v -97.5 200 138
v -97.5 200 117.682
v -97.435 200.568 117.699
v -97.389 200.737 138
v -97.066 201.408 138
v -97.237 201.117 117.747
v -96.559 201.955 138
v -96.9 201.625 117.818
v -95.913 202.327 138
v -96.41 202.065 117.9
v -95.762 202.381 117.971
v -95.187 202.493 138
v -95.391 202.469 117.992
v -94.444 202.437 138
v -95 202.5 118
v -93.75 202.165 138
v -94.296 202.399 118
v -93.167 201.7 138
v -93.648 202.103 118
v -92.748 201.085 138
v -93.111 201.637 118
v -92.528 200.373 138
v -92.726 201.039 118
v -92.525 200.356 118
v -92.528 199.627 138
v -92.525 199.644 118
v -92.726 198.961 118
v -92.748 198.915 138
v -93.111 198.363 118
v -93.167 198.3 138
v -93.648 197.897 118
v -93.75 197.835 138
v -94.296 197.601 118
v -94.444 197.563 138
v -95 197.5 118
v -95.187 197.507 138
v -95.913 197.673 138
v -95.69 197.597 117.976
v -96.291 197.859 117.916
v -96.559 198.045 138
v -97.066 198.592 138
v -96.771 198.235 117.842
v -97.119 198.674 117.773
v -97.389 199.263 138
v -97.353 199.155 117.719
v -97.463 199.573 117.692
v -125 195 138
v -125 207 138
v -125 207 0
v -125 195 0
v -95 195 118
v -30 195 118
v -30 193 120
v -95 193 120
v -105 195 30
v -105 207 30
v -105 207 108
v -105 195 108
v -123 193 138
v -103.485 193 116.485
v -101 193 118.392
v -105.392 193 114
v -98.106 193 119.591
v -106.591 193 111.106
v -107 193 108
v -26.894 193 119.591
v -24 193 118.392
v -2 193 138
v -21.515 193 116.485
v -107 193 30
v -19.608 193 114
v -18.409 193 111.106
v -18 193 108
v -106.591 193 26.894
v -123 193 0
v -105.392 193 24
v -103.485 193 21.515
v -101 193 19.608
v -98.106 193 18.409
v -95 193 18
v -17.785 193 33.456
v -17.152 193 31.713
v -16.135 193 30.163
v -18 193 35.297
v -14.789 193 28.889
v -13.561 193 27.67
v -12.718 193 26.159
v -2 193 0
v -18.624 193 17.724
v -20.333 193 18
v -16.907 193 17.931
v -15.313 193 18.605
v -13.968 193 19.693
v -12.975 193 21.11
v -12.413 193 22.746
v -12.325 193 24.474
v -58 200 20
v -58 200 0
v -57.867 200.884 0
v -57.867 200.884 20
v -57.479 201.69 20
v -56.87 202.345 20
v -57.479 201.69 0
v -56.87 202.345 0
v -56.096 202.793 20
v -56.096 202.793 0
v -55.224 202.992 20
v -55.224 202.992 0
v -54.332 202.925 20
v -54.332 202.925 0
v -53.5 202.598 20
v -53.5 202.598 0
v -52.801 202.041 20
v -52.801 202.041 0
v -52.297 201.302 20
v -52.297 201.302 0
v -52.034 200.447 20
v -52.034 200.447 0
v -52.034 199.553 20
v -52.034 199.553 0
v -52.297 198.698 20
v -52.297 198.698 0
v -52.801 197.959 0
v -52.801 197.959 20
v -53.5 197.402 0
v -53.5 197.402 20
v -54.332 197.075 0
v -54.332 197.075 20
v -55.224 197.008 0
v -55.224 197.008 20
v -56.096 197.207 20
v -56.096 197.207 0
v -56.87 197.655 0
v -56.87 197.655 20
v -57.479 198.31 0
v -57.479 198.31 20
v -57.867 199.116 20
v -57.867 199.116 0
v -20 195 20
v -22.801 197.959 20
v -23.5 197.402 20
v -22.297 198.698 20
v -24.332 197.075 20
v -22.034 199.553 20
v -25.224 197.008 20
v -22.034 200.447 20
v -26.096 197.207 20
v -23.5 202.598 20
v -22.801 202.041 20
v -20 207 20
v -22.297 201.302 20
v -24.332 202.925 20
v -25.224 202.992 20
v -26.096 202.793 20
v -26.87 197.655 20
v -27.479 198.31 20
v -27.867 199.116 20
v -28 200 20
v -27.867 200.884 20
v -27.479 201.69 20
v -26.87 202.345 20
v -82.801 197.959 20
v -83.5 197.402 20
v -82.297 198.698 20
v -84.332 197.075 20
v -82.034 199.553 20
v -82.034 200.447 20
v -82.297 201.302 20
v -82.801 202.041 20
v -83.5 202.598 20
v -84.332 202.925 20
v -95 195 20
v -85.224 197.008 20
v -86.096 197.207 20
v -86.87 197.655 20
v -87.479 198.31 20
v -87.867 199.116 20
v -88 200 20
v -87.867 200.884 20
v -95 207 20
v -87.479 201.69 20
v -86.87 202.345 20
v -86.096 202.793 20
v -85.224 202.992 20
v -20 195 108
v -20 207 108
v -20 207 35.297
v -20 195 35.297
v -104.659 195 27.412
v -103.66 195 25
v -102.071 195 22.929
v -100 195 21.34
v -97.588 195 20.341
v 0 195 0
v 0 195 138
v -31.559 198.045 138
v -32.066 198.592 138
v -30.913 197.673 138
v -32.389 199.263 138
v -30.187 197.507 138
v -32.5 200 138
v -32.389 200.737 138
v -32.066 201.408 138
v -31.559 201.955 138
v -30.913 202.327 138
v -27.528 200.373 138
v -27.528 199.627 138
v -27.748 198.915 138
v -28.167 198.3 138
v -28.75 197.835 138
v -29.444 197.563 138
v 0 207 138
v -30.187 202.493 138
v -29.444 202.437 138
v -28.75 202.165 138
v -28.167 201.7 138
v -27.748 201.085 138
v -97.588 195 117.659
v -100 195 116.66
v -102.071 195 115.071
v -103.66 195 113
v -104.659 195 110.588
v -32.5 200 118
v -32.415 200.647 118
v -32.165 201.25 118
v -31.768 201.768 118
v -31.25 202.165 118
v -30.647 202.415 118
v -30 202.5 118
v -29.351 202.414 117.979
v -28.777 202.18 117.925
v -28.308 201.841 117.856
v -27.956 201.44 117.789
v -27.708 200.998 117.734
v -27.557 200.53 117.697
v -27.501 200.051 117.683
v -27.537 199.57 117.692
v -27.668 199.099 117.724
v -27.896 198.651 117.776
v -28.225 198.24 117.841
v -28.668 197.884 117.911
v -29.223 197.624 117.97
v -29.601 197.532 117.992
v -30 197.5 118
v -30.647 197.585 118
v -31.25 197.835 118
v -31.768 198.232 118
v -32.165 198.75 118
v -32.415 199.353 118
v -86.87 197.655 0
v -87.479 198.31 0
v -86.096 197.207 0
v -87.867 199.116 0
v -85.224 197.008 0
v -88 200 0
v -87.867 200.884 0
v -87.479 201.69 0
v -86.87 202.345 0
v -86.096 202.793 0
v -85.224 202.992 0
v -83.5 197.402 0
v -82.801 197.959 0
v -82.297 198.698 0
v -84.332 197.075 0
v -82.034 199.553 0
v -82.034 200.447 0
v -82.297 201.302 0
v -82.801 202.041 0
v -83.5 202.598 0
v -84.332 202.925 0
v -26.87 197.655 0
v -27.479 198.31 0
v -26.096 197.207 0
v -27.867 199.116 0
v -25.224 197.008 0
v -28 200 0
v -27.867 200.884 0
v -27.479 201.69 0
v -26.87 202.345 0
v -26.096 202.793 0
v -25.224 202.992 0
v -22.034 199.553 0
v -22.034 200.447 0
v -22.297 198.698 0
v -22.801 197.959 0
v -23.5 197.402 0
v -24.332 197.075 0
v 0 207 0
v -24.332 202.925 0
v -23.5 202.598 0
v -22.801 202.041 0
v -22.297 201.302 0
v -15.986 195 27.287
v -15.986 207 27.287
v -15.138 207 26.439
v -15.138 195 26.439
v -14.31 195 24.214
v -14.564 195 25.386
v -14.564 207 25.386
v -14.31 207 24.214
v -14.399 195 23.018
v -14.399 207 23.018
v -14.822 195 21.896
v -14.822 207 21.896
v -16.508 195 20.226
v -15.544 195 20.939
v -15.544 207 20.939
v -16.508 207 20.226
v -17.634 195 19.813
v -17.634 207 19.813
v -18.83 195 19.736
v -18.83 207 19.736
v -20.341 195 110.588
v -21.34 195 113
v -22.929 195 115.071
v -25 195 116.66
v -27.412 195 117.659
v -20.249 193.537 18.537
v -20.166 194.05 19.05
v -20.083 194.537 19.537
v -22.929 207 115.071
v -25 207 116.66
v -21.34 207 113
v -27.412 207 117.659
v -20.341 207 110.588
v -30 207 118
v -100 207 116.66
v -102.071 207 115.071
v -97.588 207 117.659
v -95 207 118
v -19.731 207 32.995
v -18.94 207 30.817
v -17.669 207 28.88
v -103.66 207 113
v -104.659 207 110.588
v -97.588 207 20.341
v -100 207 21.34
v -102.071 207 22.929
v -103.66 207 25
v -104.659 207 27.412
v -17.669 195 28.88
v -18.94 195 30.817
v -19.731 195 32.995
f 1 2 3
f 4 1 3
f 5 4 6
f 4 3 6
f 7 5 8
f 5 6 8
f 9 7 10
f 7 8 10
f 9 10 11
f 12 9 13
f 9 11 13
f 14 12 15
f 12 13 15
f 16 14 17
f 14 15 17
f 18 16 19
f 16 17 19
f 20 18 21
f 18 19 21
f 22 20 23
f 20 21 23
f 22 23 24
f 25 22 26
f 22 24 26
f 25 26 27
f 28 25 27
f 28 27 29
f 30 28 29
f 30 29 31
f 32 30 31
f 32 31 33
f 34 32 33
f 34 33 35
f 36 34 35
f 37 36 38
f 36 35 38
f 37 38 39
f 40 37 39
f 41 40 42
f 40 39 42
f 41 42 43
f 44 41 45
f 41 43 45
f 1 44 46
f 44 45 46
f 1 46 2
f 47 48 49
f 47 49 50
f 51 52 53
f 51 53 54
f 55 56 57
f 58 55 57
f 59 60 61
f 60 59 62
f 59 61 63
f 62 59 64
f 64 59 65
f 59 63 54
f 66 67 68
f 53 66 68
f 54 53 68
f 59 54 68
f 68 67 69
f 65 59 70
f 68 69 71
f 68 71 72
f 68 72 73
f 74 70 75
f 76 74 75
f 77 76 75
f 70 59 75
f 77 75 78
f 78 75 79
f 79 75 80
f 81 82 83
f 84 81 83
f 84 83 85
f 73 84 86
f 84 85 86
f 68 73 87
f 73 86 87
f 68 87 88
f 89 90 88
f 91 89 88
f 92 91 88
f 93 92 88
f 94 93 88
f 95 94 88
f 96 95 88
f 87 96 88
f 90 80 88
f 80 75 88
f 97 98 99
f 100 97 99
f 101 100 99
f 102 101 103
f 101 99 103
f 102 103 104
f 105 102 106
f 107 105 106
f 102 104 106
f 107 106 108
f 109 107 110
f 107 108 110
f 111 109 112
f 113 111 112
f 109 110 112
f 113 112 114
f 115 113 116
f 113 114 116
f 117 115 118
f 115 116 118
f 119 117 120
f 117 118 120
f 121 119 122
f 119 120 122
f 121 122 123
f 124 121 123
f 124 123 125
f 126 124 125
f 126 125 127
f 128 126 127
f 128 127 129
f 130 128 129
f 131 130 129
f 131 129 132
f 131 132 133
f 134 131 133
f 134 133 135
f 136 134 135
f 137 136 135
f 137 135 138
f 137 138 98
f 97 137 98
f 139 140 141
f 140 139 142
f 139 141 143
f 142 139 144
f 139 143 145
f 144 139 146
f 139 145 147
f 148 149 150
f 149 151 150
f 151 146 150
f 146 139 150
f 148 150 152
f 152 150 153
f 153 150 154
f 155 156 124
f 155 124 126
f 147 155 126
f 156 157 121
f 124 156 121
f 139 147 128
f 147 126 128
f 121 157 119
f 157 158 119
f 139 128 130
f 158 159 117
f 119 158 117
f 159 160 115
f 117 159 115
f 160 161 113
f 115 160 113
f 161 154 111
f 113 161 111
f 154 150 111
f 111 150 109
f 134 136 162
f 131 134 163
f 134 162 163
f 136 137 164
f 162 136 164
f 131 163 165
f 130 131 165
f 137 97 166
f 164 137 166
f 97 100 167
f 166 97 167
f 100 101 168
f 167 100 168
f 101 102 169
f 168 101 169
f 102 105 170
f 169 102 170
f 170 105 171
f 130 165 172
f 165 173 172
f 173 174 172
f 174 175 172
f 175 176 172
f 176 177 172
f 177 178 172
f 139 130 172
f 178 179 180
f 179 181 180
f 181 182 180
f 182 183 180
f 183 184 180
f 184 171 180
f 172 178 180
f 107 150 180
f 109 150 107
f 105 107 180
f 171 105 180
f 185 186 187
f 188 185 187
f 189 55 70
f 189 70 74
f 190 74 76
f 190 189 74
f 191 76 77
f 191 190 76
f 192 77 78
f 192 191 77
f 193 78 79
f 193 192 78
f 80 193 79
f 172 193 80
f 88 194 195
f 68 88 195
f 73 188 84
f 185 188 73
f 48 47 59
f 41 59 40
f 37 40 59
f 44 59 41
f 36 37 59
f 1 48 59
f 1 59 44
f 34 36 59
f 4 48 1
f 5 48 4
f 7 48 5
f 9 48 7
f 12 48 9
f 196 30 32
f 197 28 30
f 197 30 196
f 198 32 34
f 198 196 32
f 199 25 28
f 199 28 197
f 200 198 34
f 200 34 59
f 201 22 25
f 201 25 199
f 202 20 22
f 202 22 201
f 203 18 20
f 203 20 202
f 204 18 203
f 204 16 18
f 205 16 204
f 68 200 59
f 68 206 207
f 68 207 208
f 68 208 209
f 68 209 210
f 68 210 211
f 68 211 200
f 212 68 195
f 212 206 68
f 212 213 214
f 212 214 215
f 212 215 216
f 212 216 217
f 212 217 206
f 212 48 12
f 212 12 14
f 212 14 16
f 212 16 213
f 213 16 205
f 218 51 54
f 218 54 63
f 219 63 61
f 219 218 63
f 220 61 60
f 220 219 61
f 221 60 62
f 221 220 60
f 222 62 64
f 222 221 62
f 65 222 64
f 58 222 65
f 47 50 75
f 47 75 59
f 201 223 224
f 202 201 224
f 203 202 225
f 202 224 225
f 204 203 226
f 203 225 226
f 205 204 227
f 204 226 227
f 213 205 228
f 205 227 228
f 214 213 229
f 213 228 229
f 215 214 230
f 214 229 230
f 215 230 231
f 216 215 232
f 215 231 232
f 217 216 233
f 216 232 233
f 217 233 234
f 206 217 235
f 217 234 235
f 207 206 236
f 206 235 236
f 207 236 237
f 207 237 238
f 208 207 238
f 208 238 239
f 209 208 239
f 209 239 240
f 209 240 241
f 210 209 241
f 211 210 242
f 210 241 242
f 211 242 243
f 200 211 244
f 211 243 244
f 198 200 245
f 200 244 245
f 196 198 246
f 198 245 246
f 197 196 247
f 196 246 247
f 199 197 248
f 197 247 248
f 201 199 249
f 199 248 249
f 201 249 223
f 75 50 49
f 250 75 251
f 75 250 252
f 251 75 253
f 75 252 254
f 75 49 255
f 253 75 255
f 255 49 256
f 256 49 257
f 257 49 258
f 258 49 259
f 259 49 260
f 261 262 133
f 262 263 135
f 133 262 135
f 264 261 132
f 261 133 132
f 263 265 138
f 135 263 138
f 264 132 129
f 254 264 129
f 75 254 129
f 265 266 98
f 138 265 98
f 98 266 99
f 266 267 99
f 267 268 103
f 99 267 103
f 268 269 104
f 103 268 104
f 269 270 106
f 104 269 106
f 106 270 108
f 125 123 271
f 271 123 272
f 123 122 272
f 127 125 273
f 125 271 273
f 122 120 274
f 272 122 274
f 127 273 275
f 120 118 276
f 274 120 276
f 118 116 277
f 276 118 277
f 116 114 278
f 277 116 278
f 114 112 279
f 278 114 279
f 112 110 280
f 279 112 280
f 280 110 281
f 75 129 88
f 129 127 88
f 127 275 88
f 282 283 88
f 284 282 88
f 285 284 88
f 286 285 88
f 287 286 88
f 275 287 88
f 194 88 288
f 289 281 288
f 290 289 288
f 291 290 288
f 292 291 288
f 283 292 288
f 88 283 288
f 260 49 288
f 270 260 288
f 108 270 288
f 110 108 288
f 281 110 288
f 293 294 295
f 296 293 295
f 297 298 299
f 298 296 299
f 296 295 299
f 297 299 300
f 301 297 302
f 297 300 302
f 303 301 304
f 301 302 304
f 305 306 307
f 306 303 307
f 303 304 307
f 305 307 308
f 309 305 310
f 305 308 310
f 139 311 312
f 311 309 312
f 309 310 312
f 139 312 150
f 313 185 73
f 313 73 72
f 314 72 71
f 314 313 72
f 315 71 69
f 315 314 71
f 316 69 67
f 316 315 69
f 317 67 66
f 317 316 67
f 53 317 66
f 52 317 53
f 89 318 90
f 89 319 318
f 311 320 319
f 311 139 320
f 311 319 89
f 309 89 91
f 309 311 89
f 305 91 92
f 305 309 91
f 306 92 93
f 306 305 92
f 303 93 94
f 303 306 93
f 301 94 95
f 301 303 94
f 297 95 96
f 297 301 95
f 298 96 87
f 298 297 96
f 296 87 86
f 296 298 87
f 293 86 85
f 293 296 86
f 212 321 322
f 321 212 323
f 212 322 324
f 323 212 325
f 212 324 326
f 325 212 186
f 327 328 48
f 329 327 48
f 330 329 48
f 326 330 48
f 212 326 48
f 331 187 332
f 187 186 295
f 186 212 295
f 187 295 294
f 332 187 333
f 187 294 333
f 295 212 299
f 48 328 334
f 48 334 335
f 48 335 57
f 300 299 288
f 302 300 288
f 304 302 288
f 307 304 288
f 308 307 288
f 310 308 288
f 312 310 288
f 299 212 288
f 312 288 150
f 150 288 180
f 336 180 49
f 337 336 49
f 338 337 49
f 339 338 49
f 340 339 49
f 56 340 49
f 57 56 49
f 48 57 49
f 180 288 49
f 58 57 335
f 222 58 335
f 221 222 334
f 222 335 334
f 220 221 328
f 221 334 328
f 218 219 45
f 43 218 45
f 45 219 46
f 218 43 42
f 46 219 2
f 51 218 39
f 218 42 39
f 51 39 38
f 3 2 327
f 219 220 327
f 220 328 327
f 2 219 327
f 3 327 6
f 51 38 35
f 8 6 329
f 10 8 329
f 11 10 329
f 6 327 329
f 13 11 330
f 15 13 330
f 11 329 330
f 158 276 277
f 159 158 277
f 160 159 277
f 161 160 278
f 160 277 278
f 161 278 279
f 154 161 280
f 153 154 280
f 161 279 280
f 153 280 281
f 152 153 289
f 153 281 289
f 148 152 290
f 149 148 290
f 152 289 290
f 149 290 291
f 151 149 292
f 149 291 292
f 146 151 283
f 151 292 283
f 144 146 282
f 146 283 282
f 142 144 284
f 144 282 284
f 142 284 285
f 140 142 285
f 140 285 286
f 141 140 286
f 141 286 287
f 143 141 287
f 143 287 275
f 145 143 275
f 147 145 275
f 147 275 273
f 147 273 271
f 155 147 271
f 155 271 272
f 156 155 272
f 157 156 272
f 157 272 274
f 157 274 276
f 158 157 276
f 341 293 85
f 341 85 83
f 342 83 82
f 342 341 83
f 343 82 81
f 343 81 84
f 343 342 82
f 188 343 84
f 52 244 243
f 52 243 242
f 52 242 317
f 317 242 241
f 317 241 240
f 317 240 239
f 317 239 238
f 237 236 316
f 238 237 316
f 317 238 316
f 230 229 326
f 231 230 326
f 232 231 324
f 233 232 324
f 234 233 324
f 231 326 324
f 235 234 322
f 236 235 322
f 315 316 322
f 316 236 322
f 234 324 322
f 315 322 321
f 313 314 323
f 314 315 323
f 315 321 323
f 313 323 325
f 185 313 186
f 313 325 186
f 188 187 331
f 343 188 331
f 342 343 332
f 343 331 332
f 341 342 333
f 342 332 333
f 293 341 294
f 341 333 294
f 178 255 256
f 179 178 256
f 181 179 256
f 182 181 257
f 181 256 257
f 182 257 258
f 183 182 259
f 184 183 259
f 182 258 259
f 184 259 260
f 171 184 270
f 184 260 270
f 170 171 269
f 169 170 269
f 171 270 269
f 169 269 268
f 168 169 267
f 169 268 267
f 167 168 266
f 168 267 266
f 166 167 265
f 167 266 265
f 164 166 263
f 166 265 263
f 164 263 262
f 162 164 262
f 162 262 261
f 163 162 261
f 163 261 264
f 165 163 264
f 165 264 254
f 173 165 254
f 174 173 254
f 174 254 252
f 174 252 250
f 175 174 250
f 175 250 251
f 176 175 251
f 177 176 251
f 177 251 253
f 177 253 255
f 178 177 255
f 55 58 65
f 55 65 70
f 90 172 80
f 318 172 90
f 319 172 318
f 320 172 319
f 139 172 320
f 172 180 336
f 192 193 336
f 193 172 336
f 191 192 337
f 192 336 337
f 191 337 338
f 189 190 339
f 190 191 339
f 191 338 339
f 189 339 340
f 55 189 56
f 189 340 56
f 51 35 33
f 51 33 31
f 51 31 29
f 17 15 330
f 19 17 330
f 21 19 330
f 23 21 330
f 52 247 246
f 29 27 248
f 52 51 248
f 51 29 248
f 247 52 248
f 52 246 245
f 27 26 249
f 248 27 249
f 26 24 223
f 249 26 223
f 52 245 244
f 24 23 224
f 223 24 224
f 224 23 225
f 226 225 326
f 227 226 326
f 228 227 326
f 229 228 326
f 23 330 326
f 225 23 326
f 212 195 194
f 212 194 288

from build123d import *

# Parameters (mm, degrees)
BOSS_EXTRUDE1_DEPTH       = 138
CUT_EXTRUDE1_DEPTH        = 187.721718073
F_6_0MM_DOWEL_HOLE1_D     = 6
F_6_0MM_DOWEL_HOLE1_DEPTH = 28.197418143
F_6_0MM_DOWEL_HOLE1_TIP   = 1.802581857
M6X1_0_TAPPED_HOLE1_D     = 5
M6X1_0_TAPPED_HOLE1_DEPTH = 21.497848452
M6X1_0_TAPPED_HOLE1_TIP   = 1.502151548
CHAMFER1_SIZE             = 2


with BuildPart() as part:
    # Sketch1 → Boss-Extrude1 (new body)
    with BuildSketch(Plane.XY):
        Polygon((-125, 202.5), (-125, 197.5), (-125, 193), (0, 193), (0, 207), (-125, 207), align=None)
    extrude(amount=BOSS_EXTRUDE1_DEPTH)

    # Sketch3 → Cut-Extrude1 (cut, through all)
    with BuildSketch(Plane(origin=(0, 207, 0), x_dir=(1, 0, 0), z_dir=(0, 1, 0))):
        with BuildLine():
            Line((-105, -30), (-105, -108))
            ThreePointArc((-105, -108), (-102.071067812, -115.071067812), (-95, -118))
            Line((-95, -118), (-30, -118))
            ThreePointArc((-30, -118), (-22.928932188, -115.071067812), (-20, -108))
            Line((-20, -108), (-20, -35.297163281))
            ThreePointArc((-20, -35.297163281), (-18.9403759, -30.817243777), (-15.986064246, -27.286730407))
            ThreePointArc((-15.986064246, -27.286730407), (-14.821532054, -21.896326846), (-20, -20))
            Line((-20, -20), (-95, -20))
            ThreePointArc((-95, -20), (-102.071067812, -22.928932188), (-105, -30))
        make_face()
    extrude(amount=-CUT_EXTRUDE1_DEPTH, mode=Mode.SUBTRACT)

    # Ø6.0mm Dowel Hole1
    with Locations(Plane.XY.offset(20)):
        with Locations((-25, 200), (-55, 200), (-85, 200)):
            Hole(F_6_0MM_DOWEL_HOLE1_D / 2, depth=F_6_0MM_DOWEL_HOLE1_DEPTH)
            with Locations((0, 0, -(F_6_0MM_DOWEL_HOLE1_DEPTH + F_6_0MM_DOWEL_HOLE1_TIP / 2))):  # 118° drill point
                Cone(0, F_6_0MM_DOWEL_HOLE1_D / 2, F_6_0MM_DOWEL_HOLE1_TIP, mode=Mode.SUBTRACT)

    # M6x1.0 Tapped Hole1
    with Locations(Plane.XY.offset(138)):
        with Locations((-95, 200), (-30, 200)):
            Hole(M6X1_0_TAPPED_HOLE1_D / 2, depth=M6X1_0_TAPPED_HOLE1_DEPTH)
            with Locations((0, 0, -(M6X1_0_TAPPED_HOLE1_DEPTH + M6X1_0_TAPPED_HOLE1_TIP / 2))):  # 118° drill point
                Cone(0, M6X1_0_TAPPED_HOLE1_D / 2, M6X1_0_TAPPED_HOLE1_TIP, mode=Mode.SUBTRACT)

    # Chamfer1
    chamfer1_edges = [part.edges().sort_by_distance(p)[0] for p in [
        (0, 193, 69),
        (-125, 193, 69),
        (-18.9403759, 193, 30.817243777),
        (-20, 193, 71.648581641),
        (-22.928932188, 193, 115.071067812),
        (-62.5, 193, 118),
        (-102.071067812, 193, 115.071067812),
        (-105, 193, 69),
        (-102.071067812, 193, 22.928932188),
        (-57.5, 193, 20),
        (-14.821532054, 193, 21.896326846),
    ]]
    chamfer(chamfer1_edges, length=CHAMFER1_SIZE)


solid = part.part
